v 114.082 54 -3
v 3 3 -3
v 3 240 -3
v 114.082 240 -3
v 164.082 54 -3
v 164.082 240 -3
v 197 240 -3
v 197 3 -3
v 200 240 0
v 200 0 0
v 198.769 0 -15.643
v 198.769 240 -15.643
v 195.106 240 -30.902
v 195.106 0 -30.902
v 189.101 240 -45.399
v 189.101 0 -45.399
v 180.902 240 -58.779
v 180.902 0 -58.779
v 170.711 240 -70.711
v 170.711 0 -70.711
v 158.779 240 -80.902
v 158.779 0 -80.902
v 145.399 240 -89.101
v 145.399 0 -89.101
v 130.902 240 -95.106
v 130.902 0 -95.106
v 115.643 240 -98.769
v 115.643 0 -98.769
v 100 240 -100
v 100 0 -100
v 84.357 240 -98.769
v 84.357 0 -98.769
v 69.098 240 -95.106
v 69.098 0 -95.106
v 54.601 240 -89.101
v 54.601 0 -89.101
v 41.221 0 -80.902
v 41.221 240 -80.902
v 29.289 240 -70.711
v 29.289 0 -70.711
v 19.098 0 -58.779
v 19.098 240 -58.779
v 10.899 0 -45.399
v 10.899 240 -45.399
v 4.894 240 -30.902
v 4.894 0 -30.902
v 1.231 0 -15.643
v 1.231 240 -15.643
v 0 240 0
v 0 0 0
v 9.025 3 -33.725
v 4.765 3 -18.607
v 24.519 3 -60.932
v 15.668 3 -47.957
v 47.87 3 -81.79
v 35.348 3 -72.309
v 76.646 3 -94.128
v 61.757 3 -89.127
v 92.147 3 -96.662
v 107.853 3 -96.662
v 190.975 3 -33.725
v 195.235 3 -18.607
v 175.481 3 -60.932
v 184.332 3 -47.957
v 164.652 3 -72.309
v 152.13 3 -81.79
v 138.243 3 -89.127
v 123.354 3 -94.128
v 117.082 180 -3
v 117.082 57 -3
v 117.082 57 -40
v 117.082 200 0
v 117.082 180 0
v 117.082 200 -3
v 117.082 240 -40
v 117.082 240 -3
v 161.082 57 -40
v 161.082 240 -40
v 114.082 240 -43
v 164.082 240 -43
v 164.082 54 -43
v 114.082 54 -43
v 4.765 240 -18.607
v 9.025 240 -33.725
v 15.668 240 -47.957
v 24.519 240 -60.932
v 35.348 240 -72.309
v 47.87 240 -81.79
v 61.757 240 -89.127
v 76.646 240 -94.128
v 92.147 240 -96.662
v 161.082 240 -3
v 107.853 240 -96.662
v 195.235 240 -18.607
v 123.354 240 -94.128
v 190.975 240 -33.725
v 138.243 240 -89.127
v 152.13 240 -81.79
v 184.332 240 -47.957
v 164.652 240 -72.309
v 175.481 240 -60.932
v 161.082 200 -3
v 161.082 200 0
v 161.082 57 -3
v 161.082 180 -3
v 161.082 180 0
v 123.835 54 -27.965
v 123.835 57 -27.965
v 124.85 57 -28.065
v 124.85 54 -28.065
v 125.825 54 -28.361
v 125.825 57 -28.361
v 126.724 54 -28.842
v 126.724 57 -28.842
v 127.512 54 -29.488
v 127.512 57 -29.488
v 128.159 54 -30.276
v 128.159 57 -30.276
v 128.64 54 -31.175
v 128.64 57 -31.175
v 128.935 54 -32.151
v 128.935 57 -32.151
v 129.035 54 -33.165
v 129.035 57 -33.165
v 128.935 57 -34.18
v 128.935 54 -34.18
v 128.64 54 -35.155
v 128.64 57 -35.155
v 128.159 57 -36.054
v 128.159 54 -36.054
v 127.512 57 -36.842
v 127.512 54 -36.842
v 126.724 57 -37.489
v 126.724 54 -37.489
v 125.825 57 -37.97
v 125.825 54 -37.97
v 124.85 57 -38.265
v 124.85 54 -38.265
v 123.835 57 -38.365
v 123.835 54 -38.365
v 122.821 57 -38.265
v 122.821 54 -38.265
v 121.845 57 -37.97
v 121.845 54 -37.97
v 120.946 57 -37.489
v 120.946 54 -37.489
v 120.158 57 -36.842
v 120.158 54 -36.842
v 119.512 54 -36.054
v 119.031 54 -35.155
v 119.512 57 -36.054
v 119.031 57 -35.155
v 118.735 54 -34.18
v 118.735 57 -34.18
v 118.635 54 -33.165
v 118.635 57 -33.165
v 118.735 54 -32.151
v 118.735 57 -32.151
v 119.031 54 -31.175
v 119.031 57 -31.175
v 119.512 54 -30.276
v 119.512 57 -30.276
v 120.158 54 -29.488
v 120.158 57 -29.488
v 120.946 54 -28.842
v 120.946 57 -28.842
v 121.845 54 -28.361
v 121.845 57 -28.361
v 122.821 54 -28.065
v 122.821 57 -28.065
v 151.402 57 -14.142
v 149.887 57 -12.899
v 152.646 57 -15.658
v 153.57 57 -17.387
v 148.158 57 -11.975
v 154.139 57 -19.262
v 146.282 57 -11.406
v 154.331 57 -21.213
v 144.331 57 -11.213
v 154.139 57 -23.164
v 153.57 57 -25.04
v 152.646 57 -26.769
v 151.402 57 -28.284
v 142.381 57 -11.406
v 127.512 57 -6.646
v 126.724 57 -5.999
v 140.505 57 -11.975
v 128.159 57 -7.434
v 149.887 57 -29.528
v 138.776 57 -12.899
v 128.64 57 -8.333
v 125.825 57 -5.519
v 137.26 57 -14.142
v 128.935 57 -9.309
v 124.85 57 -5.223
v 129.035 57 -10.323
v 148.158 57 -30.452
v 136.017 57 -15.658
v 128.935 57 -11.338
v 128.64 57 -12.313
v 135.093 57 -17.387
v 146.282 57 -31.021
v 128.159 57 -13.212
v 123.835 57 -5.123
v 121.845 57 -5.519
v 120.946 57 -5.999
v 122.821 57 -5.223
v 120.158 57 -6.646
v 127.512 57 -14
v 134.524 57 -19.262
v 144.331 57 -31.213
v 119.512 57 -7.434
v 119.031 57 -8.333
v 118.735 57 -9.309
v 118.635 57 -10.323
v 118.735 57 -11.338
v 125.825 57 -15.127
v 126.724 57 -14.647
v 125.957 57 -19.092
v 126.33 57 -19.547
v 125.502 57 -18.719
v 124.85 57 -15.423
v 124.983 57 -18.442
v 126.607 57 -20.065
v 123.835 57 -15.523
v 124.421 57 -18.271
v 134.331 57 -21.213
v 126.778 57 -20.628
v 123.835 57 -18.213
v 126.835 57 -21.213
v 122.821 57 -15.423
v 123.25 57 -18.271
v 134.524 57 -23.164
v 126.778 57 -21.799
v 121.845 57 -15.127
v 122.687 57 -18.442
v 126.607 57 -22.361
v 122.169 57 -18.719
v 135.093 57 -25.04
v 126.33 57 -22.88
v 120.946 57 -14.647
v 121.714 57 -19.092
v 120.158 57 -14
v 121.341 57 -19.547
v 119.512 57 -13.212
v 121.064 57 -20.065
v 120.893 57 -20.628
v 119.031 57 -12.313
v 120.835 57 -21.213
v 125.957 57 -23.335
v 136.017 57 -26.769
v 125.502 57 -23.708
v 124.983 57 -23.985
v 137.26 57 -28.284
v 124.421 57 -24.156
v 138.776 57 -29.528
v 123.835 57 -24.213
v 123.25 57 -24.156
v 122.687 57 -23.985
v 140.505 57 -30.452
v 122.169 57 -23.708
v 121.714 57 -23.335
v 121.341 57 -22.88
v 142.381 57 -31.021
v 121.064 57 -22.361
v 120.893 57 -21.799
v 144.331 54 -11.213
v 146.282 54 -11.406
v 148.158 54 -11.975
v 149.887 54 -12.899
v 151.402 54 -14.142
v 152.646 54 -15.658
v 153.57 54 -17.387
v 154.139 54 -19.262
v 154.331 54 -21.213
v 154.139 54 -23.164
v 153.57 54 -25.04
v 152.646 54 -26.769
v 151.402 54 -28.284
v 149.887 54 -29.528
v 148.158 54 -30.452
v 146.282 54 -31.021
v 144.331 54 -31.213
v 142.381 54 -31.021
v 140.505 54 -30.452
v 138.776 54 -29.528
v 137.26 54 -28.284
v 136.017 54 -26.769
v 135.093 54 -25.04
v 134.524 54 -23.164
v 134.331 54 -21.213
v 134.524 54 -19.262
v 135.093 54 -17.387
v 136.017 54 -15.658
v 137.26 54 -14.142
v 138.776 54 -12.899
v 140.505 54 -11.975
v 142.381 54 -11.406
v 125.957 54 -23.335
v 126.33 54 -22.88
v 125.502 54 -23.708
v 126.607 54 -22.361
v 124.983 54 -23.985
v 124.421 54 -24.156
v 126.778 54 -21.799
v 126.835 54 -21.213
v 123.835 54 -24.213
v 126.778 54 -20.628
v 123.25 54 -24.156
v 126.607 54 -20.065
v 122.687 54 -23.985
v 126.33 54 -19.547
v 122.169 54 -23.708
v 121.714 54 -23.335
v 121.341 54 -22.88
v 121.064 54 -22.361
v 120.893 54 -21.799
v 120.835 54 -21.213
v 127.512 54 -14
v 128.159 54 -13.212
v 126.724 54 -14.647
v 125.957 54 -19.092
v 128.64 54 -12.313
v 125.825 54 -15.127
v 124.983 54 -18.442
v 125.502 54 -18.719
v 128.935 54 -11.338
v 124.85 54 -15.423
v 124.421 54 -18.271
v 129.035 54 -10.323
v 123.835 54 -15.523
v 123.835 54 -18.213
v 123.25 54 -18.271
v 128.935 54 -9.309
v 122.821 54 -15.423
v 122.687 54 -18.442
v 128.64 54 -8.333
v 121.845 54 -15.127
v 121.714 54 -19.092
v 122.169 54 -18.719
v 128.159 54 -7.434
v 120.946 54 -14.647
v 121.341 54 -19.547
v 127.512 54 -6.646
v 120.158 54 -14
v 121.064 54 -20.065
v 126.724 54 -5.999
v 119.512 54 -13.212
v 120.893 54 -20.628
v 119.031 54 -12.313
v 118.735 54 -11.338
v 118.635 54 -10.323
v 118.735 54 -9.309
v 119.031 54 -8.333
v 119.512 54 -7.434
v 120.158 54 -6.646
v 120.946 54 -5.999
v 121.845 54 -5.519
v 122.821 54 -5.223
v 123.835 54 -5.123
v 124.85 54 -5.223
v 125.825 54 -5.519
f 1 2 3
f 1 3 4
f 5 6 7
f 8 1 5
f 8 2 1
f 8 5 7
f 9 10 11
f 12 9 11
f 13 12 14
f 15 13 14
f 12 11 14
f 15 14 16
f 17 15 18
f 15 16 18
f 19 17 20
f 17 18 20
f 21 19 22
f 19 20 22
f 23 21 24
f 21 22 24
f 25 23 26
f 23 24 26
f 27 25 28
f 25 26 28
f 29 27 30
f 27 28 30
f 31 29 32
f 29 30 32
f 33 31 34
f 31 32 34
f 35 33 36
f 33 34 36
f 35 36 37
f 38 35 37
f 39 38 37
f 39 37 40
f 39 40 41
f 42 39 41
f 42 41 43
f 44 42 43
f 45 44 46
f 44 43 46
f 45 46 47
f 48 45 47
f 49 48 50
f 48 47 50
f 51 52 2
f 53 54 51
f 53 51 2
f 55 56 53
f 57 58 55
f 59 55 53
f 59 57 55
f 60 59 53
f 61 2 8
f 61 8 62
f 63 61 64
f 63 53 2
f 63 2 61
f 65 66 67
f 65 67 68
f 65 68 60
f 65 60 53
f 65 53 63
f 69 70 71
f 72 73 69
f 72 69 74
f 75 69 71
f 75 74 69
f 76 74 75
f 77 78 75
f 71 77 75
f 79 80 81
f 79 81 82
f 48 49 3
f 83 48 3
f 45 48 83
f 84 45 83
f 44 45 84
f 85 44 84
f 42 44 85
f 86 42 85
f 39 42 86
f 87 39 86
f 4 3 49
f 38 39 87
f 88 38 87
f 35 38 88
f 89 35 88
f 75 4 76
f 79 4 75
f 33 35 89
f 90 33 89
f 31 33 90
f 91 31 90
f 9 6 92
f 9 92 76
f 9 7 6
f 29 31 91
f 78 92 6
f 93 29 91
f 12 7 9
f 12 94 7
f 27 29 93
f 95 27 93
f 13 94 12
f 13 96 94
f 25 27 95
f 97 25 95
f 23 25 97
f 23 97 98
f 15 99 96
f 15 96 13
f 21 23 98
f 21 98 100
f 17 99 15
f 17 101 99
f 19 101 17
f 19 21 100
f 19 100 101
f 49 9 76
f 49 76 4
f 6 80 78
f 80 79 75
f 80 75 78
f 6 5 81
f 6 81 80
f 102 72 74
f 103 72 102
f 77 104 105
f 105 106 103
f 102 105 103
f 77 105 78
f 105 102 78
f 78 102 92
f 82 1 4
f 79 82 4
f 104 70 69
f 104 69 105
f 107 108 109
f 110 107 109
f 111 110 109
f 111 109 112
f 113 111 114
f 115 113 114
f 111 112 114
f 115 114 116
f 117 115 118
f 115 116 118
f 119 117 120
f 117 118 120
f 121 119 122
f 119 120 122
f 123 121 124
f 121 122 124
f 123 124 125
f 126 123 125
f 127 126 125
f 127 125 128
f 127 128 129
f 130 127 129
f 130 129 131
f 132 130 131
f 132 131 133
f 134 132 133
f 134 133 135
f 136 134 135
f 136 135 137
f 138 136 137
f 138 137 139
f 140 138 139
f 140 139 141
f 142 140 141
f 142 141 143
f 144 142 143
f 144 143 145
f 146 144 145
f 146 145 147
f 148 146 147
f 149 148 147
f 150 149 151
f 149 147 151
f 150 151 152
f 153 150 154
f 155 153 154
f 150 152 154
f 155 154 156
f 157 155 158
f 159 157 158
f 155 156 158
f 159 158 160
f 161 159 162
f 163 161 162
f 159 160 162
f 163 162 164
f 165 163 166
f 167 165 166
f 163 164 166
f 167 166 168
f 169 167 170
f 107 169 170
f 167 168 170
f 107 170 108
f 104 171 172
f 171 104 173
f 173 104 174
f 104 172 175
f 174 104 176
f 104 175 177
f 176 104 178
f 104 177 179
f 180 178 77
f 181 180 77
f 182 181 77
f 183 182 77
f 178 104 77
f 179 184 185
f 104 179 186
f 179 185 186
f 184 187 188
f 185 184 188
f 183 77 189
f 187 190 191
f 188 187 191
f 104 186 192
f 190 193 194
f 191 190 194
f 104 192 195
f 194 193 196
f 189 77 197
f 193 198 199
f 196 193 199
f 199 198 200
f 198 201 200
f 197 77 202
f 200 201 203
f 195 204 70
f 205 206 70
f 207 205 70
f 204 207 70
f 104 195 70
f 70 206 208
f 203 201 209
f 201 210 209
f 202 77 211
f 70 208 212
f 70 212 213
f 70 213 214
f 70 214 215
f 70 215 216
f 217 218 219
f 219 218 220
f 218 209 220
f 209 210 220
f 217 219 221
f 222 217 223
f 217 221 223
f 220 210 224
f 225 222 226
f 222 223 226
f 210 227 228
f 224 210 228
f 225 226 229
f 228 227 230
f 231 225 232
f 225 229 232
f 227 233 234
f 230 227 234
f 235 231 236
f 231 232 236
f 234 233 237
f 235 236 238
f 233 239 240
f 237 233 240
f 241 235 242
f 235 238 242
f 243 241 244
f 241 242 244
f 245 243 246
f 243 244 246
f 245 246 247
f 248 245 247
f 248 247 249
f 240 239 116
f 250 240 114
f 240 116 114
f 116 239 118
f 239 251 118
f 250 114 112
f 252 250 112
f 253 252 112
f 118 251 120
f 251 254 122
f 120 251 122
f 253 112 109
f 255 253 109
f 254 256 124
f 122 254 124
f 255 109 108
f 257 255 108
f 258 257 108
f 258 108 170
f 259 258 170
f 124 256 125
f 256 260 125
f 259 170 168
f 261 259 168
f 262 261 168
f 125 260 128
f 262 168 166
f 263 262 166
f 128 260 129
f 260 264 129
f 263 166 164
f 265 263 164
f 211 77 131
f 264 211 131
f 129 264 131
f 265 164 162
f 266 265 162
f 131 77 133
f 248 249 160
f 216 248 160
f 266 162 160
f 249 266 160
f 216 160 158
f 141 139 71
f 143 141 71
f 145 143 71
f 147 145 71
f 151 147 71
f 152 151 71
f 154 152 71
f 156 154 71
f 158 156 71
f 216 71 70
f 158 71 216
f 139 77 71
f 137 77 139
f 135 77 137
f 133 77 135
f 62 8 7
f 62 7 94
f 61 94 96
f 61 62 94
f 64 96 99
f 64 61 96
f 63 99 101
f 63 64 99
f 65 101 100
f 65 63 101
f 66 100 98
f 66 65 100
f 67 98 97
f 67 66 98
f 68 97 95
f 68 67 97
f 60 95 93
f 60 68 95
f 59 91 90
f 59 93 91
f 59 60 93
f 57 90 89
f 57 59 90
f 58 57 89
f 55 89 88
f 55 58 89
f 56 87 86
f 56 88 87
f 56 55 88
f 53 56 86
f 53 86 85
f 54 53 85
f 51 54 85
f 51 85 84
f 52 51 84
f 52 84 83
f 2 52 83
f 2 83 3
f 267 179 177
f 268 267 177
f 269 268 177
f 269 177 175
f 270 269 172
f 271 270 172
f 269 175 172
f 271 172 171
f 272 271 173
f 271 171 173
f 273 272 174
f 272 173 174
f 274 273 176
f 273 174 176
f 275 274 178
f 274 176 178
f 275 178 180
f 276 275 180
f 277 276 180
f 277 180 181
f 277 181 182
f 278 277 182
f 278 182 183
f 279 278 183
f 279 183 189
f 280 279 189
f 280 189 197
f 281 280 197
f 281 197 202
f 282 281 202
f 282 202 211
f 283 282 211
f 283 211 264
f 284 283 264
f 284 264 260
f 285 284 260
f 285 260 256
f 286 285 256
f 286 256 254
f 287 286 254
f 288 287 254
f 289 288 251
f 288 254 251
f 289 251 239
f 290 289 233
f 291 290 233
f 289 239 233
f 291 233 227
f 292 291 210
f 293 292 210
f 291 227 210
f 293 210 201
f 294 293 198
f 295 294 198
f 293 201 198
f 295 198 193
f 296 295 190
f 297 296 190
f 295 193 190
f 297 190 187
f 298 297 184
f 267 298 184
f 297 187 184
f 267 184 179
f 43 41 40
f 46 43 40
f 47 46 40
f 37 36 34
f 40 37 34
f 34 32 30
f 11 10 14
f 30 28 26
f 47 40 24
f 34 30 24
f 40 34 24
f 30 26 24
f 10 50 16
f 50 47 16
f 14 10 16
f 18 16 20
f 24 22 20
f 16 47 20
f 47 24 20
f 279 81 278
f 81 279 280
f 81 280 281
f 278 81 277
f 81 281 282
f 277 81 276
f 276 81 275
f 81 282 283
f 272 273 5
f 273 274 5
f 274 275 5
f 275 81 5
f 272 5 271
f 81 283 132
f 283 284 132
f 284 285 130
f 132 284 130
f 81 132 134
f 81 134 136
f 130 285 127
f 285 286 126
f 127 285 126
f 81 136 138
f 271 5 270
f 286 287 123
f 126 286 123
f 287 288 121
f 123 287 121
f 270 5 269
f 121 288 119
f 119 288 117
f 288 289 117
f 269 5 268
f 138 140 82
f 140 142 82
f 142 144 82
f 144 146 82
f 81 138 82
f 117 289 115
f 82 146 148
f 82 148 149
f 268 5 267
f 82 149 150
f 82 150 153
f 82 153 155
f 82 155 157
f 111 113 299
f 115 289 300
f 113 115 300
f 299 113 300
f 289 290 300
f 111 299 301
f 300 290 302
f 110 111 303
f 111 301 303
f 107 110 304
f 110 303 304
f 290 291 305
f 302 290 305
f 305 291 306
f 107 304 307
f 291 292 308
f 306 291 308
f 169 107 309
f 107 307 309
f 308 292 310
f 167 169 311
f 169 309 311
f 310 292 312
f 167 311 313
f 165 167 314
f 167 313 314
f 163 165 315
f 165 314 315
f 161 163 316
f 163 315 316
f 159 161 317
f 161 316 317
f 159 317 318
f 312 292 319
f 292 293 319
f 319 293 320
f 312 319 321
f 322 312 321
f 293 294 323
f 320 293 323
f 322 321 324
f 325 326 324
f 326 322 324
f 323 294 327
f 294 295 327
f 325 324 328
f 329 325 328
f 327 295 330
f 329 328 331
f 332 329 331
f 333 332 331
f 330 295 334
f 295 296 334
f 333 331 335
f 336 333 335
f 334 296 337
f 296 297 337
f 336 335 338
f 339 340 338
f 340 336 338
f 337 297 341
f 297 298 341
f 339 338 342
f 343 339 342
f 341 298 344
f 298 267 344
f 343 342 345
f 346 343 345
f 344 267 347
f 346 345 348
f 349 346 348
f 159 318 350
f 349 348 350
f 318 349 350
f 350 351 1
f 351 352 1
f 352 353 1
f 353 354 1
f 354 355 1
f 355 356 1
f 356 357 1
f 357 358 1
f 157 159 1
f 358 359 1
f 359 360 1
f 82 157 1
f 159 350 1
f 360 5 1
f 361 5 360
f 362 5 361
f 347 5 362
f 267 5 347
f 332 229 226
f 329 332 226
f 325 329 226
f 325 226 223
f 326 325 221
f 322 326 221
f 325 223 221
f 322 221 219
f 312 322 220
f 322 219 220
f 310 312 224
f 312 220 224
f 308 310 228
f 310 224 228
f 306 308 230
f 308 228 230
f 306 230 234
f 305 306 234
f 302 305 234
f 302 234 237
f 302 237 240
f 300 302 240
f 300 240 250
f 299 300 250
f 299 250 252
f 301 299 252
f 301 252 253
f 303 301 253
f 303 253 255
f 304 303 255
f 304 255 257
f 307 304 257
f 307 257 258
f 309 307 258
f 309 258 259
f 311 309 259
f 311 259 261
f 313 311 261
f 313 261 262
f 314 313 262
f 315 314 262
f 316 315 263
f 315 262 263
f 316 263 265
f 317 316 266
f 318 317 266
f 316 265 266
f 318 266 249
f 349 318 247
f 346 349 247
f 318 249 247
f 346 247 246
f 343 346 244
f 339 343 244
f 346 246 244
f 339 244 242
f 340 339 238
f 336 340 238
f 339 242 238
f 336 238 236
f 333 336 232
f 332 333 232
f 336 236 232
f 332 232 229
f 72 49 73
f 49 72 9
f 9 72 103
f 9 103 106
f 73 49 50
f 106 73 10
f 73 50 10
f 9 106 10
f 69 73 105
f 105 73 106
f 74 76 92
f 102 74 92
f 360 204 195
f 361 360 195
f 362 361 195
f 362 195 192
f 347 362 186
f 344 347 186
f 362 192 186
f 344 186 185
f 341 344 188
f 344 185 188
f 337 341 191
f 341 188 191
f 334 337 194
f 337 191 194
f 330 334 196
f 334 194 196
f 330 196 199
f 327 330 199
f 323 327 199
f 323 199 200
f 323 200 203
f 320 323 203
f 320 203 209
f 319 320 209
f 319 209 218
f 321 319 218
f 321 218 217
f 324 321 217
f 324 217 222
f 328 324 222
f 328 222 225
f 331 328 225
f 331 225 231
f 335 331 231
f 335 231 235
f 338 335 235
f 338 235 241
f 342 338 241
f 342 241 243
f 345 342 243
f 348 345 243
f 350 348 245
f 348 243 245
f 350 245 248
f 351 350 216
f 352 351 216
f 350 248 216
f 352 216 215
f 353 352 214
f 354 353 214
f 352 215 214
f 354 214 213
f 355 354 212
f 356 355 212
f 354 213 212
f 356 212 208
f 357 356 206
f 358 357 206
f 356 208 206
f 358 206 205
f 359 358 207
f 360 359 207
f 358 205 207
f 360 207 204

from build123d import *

# Parameters (mm, degrees)
EXTRUDE_1_DEPTH          = 240
CUT_EXTRUDE_3_DEPTH      = 326.109212419
CUT_EXTRUDE_3_DEPTH_BACK = 326.109212419
EXTRUDE_3_DEPTH          = 3
SKETCH_11_W              = 50
SKETCH_11_H              = 186
EXTRUDE_5_DEPTH          = 40
CUT_EXTRUDE_4_DEPTH      = 183
SKETCH_13_R              = 10
SKETCH_13_R_2            = 3
SKETCH_13_R_3            = 5.2
CUT_EXTRUDE_5_DEPTH      = 187
SKETCH_16_W              = 44
SKETCH_16_H              = 20
CUT_EXTRUDE_6_DEPTH      = 3


with BuildPart() as part:
    # 草图2 → 凸台-拉伸1 (new body)
    with BuildSketch(Plane(origin=(0, 0, 0), x_dir=(1, 0, 0), z_dir=(0, 1, 0))):
        with BuildLine():
            Line((0, 0), (200, 0))
            ThreePointArc((200, 0), (100, 100), (0, 0))
        make_face()
    extrude(amount=EXTRUDE_1_DEPTH)

    # 草图4 → 切除-拉伸3 (cut, two sides: drawn at the far end of the back side and taken through both)
    with BuildSketch(Plane(origin=(0, 4, 0), x_dir=(1, 0, 0), z_dir=(0, 1, 0)).offset(-CUT_EXTRUDE_3_DEPTH_BACK)):
        with BuildLine():
            Line((3, 3), (197, 3))
            ThreePointArc((197, 3), (100, 96.979861709), (3, 3))
        make_face()
    extrude(amount=CUT_EXTRUDE_3_DEPTH + CUT_EXTRUDE_3_DEPTH_BACK, mode=Mode.SUBTRACT)

    # 草图10 → 凸台-拉伸3 (add)
    with BuildSketch(Plane(origin=(0, 0, 0), x_dir=(1, 0, 0), z_dir=(0, 1, 0))):
        with BuildLine():
            Line((3, 3), (197, 3))
            ThreePointArc((197, 3), (100, 96.979861709), (3, 3))
        make_face()
    extrude(amount=EXTRUDE_3_DEPTH)

    # 草图11 → 凸台-拉伸5 (add)
    with BuildSketch(Plane(origin=(0, 0, -3), x_dir=(-1, 0, 0), z_dir=(0, 0, -1))):
        with Locations((-139.082312279, 147)):
            Rectangle(SKETCH_11_W, SKETCH_11_H)
    extrude(amount=EXTRUDE_5_DEPTH)

    # 草图12 → 切除-拉伸4 (cut)
    with BuildSketch(Plane(origin=(0, 240, 0), x_dir=(1, 0, 0), z_dir=(0, 1, 0))):
        Polygon((117.082312279, 3), (117.082312279, 40), (128.082312279, 40), (131.082312279, 40), (161.082312279, 40), (161.082312279, 3), (131.082312279, 3), (128.082312279, 3), align=None)
    extrude(amount=-CUT_EXTRUDE_4_DEPTH, mode=Mode.SUBTRACT)

    # 草图13 → 切除-拉伸5 (cut)
    with BuildSketch(Plane(origin=(0, 240, 0), x_dir=(1, 0, 0), z_dir=(0, 1, 0))):
        with Locations(Location((144.331422693, 21.213361888, 0), (0, 0, 270))):
            Circle(SKETCH_13_R)
        with Locations(Location((123.835336357, 21.213361888, 0), (0, 0, 270))):
            Circle(SKETCH_13_R_2)
        with Locations(Location((123.835336357, 10.323097486, 0), (0, 0, 270))):
            Circle(SKETCH_13_R_3)
        with Locations(Location((123.835336357, 33.165384847, 0), (0, 0, 270))):
            Circle(SKETCH_13_R_3)
    extrude(amount=-CUT_EXTRUDE_5_DEPTH, mode=Mode.SUBTRACT)

    # 草图16 → 切除-拉伸6 (cut)
    with BuildSketch(Plane.XY):
        with Locations((139.082312279, 190)):
            Rectangle(SKETCH_16_W, SKETCH_16_H)
    extrude(amount=-CUT_EXTRUDE_6_DEPTH, mode=Mode.SUBTRACT)


solid = part.part
